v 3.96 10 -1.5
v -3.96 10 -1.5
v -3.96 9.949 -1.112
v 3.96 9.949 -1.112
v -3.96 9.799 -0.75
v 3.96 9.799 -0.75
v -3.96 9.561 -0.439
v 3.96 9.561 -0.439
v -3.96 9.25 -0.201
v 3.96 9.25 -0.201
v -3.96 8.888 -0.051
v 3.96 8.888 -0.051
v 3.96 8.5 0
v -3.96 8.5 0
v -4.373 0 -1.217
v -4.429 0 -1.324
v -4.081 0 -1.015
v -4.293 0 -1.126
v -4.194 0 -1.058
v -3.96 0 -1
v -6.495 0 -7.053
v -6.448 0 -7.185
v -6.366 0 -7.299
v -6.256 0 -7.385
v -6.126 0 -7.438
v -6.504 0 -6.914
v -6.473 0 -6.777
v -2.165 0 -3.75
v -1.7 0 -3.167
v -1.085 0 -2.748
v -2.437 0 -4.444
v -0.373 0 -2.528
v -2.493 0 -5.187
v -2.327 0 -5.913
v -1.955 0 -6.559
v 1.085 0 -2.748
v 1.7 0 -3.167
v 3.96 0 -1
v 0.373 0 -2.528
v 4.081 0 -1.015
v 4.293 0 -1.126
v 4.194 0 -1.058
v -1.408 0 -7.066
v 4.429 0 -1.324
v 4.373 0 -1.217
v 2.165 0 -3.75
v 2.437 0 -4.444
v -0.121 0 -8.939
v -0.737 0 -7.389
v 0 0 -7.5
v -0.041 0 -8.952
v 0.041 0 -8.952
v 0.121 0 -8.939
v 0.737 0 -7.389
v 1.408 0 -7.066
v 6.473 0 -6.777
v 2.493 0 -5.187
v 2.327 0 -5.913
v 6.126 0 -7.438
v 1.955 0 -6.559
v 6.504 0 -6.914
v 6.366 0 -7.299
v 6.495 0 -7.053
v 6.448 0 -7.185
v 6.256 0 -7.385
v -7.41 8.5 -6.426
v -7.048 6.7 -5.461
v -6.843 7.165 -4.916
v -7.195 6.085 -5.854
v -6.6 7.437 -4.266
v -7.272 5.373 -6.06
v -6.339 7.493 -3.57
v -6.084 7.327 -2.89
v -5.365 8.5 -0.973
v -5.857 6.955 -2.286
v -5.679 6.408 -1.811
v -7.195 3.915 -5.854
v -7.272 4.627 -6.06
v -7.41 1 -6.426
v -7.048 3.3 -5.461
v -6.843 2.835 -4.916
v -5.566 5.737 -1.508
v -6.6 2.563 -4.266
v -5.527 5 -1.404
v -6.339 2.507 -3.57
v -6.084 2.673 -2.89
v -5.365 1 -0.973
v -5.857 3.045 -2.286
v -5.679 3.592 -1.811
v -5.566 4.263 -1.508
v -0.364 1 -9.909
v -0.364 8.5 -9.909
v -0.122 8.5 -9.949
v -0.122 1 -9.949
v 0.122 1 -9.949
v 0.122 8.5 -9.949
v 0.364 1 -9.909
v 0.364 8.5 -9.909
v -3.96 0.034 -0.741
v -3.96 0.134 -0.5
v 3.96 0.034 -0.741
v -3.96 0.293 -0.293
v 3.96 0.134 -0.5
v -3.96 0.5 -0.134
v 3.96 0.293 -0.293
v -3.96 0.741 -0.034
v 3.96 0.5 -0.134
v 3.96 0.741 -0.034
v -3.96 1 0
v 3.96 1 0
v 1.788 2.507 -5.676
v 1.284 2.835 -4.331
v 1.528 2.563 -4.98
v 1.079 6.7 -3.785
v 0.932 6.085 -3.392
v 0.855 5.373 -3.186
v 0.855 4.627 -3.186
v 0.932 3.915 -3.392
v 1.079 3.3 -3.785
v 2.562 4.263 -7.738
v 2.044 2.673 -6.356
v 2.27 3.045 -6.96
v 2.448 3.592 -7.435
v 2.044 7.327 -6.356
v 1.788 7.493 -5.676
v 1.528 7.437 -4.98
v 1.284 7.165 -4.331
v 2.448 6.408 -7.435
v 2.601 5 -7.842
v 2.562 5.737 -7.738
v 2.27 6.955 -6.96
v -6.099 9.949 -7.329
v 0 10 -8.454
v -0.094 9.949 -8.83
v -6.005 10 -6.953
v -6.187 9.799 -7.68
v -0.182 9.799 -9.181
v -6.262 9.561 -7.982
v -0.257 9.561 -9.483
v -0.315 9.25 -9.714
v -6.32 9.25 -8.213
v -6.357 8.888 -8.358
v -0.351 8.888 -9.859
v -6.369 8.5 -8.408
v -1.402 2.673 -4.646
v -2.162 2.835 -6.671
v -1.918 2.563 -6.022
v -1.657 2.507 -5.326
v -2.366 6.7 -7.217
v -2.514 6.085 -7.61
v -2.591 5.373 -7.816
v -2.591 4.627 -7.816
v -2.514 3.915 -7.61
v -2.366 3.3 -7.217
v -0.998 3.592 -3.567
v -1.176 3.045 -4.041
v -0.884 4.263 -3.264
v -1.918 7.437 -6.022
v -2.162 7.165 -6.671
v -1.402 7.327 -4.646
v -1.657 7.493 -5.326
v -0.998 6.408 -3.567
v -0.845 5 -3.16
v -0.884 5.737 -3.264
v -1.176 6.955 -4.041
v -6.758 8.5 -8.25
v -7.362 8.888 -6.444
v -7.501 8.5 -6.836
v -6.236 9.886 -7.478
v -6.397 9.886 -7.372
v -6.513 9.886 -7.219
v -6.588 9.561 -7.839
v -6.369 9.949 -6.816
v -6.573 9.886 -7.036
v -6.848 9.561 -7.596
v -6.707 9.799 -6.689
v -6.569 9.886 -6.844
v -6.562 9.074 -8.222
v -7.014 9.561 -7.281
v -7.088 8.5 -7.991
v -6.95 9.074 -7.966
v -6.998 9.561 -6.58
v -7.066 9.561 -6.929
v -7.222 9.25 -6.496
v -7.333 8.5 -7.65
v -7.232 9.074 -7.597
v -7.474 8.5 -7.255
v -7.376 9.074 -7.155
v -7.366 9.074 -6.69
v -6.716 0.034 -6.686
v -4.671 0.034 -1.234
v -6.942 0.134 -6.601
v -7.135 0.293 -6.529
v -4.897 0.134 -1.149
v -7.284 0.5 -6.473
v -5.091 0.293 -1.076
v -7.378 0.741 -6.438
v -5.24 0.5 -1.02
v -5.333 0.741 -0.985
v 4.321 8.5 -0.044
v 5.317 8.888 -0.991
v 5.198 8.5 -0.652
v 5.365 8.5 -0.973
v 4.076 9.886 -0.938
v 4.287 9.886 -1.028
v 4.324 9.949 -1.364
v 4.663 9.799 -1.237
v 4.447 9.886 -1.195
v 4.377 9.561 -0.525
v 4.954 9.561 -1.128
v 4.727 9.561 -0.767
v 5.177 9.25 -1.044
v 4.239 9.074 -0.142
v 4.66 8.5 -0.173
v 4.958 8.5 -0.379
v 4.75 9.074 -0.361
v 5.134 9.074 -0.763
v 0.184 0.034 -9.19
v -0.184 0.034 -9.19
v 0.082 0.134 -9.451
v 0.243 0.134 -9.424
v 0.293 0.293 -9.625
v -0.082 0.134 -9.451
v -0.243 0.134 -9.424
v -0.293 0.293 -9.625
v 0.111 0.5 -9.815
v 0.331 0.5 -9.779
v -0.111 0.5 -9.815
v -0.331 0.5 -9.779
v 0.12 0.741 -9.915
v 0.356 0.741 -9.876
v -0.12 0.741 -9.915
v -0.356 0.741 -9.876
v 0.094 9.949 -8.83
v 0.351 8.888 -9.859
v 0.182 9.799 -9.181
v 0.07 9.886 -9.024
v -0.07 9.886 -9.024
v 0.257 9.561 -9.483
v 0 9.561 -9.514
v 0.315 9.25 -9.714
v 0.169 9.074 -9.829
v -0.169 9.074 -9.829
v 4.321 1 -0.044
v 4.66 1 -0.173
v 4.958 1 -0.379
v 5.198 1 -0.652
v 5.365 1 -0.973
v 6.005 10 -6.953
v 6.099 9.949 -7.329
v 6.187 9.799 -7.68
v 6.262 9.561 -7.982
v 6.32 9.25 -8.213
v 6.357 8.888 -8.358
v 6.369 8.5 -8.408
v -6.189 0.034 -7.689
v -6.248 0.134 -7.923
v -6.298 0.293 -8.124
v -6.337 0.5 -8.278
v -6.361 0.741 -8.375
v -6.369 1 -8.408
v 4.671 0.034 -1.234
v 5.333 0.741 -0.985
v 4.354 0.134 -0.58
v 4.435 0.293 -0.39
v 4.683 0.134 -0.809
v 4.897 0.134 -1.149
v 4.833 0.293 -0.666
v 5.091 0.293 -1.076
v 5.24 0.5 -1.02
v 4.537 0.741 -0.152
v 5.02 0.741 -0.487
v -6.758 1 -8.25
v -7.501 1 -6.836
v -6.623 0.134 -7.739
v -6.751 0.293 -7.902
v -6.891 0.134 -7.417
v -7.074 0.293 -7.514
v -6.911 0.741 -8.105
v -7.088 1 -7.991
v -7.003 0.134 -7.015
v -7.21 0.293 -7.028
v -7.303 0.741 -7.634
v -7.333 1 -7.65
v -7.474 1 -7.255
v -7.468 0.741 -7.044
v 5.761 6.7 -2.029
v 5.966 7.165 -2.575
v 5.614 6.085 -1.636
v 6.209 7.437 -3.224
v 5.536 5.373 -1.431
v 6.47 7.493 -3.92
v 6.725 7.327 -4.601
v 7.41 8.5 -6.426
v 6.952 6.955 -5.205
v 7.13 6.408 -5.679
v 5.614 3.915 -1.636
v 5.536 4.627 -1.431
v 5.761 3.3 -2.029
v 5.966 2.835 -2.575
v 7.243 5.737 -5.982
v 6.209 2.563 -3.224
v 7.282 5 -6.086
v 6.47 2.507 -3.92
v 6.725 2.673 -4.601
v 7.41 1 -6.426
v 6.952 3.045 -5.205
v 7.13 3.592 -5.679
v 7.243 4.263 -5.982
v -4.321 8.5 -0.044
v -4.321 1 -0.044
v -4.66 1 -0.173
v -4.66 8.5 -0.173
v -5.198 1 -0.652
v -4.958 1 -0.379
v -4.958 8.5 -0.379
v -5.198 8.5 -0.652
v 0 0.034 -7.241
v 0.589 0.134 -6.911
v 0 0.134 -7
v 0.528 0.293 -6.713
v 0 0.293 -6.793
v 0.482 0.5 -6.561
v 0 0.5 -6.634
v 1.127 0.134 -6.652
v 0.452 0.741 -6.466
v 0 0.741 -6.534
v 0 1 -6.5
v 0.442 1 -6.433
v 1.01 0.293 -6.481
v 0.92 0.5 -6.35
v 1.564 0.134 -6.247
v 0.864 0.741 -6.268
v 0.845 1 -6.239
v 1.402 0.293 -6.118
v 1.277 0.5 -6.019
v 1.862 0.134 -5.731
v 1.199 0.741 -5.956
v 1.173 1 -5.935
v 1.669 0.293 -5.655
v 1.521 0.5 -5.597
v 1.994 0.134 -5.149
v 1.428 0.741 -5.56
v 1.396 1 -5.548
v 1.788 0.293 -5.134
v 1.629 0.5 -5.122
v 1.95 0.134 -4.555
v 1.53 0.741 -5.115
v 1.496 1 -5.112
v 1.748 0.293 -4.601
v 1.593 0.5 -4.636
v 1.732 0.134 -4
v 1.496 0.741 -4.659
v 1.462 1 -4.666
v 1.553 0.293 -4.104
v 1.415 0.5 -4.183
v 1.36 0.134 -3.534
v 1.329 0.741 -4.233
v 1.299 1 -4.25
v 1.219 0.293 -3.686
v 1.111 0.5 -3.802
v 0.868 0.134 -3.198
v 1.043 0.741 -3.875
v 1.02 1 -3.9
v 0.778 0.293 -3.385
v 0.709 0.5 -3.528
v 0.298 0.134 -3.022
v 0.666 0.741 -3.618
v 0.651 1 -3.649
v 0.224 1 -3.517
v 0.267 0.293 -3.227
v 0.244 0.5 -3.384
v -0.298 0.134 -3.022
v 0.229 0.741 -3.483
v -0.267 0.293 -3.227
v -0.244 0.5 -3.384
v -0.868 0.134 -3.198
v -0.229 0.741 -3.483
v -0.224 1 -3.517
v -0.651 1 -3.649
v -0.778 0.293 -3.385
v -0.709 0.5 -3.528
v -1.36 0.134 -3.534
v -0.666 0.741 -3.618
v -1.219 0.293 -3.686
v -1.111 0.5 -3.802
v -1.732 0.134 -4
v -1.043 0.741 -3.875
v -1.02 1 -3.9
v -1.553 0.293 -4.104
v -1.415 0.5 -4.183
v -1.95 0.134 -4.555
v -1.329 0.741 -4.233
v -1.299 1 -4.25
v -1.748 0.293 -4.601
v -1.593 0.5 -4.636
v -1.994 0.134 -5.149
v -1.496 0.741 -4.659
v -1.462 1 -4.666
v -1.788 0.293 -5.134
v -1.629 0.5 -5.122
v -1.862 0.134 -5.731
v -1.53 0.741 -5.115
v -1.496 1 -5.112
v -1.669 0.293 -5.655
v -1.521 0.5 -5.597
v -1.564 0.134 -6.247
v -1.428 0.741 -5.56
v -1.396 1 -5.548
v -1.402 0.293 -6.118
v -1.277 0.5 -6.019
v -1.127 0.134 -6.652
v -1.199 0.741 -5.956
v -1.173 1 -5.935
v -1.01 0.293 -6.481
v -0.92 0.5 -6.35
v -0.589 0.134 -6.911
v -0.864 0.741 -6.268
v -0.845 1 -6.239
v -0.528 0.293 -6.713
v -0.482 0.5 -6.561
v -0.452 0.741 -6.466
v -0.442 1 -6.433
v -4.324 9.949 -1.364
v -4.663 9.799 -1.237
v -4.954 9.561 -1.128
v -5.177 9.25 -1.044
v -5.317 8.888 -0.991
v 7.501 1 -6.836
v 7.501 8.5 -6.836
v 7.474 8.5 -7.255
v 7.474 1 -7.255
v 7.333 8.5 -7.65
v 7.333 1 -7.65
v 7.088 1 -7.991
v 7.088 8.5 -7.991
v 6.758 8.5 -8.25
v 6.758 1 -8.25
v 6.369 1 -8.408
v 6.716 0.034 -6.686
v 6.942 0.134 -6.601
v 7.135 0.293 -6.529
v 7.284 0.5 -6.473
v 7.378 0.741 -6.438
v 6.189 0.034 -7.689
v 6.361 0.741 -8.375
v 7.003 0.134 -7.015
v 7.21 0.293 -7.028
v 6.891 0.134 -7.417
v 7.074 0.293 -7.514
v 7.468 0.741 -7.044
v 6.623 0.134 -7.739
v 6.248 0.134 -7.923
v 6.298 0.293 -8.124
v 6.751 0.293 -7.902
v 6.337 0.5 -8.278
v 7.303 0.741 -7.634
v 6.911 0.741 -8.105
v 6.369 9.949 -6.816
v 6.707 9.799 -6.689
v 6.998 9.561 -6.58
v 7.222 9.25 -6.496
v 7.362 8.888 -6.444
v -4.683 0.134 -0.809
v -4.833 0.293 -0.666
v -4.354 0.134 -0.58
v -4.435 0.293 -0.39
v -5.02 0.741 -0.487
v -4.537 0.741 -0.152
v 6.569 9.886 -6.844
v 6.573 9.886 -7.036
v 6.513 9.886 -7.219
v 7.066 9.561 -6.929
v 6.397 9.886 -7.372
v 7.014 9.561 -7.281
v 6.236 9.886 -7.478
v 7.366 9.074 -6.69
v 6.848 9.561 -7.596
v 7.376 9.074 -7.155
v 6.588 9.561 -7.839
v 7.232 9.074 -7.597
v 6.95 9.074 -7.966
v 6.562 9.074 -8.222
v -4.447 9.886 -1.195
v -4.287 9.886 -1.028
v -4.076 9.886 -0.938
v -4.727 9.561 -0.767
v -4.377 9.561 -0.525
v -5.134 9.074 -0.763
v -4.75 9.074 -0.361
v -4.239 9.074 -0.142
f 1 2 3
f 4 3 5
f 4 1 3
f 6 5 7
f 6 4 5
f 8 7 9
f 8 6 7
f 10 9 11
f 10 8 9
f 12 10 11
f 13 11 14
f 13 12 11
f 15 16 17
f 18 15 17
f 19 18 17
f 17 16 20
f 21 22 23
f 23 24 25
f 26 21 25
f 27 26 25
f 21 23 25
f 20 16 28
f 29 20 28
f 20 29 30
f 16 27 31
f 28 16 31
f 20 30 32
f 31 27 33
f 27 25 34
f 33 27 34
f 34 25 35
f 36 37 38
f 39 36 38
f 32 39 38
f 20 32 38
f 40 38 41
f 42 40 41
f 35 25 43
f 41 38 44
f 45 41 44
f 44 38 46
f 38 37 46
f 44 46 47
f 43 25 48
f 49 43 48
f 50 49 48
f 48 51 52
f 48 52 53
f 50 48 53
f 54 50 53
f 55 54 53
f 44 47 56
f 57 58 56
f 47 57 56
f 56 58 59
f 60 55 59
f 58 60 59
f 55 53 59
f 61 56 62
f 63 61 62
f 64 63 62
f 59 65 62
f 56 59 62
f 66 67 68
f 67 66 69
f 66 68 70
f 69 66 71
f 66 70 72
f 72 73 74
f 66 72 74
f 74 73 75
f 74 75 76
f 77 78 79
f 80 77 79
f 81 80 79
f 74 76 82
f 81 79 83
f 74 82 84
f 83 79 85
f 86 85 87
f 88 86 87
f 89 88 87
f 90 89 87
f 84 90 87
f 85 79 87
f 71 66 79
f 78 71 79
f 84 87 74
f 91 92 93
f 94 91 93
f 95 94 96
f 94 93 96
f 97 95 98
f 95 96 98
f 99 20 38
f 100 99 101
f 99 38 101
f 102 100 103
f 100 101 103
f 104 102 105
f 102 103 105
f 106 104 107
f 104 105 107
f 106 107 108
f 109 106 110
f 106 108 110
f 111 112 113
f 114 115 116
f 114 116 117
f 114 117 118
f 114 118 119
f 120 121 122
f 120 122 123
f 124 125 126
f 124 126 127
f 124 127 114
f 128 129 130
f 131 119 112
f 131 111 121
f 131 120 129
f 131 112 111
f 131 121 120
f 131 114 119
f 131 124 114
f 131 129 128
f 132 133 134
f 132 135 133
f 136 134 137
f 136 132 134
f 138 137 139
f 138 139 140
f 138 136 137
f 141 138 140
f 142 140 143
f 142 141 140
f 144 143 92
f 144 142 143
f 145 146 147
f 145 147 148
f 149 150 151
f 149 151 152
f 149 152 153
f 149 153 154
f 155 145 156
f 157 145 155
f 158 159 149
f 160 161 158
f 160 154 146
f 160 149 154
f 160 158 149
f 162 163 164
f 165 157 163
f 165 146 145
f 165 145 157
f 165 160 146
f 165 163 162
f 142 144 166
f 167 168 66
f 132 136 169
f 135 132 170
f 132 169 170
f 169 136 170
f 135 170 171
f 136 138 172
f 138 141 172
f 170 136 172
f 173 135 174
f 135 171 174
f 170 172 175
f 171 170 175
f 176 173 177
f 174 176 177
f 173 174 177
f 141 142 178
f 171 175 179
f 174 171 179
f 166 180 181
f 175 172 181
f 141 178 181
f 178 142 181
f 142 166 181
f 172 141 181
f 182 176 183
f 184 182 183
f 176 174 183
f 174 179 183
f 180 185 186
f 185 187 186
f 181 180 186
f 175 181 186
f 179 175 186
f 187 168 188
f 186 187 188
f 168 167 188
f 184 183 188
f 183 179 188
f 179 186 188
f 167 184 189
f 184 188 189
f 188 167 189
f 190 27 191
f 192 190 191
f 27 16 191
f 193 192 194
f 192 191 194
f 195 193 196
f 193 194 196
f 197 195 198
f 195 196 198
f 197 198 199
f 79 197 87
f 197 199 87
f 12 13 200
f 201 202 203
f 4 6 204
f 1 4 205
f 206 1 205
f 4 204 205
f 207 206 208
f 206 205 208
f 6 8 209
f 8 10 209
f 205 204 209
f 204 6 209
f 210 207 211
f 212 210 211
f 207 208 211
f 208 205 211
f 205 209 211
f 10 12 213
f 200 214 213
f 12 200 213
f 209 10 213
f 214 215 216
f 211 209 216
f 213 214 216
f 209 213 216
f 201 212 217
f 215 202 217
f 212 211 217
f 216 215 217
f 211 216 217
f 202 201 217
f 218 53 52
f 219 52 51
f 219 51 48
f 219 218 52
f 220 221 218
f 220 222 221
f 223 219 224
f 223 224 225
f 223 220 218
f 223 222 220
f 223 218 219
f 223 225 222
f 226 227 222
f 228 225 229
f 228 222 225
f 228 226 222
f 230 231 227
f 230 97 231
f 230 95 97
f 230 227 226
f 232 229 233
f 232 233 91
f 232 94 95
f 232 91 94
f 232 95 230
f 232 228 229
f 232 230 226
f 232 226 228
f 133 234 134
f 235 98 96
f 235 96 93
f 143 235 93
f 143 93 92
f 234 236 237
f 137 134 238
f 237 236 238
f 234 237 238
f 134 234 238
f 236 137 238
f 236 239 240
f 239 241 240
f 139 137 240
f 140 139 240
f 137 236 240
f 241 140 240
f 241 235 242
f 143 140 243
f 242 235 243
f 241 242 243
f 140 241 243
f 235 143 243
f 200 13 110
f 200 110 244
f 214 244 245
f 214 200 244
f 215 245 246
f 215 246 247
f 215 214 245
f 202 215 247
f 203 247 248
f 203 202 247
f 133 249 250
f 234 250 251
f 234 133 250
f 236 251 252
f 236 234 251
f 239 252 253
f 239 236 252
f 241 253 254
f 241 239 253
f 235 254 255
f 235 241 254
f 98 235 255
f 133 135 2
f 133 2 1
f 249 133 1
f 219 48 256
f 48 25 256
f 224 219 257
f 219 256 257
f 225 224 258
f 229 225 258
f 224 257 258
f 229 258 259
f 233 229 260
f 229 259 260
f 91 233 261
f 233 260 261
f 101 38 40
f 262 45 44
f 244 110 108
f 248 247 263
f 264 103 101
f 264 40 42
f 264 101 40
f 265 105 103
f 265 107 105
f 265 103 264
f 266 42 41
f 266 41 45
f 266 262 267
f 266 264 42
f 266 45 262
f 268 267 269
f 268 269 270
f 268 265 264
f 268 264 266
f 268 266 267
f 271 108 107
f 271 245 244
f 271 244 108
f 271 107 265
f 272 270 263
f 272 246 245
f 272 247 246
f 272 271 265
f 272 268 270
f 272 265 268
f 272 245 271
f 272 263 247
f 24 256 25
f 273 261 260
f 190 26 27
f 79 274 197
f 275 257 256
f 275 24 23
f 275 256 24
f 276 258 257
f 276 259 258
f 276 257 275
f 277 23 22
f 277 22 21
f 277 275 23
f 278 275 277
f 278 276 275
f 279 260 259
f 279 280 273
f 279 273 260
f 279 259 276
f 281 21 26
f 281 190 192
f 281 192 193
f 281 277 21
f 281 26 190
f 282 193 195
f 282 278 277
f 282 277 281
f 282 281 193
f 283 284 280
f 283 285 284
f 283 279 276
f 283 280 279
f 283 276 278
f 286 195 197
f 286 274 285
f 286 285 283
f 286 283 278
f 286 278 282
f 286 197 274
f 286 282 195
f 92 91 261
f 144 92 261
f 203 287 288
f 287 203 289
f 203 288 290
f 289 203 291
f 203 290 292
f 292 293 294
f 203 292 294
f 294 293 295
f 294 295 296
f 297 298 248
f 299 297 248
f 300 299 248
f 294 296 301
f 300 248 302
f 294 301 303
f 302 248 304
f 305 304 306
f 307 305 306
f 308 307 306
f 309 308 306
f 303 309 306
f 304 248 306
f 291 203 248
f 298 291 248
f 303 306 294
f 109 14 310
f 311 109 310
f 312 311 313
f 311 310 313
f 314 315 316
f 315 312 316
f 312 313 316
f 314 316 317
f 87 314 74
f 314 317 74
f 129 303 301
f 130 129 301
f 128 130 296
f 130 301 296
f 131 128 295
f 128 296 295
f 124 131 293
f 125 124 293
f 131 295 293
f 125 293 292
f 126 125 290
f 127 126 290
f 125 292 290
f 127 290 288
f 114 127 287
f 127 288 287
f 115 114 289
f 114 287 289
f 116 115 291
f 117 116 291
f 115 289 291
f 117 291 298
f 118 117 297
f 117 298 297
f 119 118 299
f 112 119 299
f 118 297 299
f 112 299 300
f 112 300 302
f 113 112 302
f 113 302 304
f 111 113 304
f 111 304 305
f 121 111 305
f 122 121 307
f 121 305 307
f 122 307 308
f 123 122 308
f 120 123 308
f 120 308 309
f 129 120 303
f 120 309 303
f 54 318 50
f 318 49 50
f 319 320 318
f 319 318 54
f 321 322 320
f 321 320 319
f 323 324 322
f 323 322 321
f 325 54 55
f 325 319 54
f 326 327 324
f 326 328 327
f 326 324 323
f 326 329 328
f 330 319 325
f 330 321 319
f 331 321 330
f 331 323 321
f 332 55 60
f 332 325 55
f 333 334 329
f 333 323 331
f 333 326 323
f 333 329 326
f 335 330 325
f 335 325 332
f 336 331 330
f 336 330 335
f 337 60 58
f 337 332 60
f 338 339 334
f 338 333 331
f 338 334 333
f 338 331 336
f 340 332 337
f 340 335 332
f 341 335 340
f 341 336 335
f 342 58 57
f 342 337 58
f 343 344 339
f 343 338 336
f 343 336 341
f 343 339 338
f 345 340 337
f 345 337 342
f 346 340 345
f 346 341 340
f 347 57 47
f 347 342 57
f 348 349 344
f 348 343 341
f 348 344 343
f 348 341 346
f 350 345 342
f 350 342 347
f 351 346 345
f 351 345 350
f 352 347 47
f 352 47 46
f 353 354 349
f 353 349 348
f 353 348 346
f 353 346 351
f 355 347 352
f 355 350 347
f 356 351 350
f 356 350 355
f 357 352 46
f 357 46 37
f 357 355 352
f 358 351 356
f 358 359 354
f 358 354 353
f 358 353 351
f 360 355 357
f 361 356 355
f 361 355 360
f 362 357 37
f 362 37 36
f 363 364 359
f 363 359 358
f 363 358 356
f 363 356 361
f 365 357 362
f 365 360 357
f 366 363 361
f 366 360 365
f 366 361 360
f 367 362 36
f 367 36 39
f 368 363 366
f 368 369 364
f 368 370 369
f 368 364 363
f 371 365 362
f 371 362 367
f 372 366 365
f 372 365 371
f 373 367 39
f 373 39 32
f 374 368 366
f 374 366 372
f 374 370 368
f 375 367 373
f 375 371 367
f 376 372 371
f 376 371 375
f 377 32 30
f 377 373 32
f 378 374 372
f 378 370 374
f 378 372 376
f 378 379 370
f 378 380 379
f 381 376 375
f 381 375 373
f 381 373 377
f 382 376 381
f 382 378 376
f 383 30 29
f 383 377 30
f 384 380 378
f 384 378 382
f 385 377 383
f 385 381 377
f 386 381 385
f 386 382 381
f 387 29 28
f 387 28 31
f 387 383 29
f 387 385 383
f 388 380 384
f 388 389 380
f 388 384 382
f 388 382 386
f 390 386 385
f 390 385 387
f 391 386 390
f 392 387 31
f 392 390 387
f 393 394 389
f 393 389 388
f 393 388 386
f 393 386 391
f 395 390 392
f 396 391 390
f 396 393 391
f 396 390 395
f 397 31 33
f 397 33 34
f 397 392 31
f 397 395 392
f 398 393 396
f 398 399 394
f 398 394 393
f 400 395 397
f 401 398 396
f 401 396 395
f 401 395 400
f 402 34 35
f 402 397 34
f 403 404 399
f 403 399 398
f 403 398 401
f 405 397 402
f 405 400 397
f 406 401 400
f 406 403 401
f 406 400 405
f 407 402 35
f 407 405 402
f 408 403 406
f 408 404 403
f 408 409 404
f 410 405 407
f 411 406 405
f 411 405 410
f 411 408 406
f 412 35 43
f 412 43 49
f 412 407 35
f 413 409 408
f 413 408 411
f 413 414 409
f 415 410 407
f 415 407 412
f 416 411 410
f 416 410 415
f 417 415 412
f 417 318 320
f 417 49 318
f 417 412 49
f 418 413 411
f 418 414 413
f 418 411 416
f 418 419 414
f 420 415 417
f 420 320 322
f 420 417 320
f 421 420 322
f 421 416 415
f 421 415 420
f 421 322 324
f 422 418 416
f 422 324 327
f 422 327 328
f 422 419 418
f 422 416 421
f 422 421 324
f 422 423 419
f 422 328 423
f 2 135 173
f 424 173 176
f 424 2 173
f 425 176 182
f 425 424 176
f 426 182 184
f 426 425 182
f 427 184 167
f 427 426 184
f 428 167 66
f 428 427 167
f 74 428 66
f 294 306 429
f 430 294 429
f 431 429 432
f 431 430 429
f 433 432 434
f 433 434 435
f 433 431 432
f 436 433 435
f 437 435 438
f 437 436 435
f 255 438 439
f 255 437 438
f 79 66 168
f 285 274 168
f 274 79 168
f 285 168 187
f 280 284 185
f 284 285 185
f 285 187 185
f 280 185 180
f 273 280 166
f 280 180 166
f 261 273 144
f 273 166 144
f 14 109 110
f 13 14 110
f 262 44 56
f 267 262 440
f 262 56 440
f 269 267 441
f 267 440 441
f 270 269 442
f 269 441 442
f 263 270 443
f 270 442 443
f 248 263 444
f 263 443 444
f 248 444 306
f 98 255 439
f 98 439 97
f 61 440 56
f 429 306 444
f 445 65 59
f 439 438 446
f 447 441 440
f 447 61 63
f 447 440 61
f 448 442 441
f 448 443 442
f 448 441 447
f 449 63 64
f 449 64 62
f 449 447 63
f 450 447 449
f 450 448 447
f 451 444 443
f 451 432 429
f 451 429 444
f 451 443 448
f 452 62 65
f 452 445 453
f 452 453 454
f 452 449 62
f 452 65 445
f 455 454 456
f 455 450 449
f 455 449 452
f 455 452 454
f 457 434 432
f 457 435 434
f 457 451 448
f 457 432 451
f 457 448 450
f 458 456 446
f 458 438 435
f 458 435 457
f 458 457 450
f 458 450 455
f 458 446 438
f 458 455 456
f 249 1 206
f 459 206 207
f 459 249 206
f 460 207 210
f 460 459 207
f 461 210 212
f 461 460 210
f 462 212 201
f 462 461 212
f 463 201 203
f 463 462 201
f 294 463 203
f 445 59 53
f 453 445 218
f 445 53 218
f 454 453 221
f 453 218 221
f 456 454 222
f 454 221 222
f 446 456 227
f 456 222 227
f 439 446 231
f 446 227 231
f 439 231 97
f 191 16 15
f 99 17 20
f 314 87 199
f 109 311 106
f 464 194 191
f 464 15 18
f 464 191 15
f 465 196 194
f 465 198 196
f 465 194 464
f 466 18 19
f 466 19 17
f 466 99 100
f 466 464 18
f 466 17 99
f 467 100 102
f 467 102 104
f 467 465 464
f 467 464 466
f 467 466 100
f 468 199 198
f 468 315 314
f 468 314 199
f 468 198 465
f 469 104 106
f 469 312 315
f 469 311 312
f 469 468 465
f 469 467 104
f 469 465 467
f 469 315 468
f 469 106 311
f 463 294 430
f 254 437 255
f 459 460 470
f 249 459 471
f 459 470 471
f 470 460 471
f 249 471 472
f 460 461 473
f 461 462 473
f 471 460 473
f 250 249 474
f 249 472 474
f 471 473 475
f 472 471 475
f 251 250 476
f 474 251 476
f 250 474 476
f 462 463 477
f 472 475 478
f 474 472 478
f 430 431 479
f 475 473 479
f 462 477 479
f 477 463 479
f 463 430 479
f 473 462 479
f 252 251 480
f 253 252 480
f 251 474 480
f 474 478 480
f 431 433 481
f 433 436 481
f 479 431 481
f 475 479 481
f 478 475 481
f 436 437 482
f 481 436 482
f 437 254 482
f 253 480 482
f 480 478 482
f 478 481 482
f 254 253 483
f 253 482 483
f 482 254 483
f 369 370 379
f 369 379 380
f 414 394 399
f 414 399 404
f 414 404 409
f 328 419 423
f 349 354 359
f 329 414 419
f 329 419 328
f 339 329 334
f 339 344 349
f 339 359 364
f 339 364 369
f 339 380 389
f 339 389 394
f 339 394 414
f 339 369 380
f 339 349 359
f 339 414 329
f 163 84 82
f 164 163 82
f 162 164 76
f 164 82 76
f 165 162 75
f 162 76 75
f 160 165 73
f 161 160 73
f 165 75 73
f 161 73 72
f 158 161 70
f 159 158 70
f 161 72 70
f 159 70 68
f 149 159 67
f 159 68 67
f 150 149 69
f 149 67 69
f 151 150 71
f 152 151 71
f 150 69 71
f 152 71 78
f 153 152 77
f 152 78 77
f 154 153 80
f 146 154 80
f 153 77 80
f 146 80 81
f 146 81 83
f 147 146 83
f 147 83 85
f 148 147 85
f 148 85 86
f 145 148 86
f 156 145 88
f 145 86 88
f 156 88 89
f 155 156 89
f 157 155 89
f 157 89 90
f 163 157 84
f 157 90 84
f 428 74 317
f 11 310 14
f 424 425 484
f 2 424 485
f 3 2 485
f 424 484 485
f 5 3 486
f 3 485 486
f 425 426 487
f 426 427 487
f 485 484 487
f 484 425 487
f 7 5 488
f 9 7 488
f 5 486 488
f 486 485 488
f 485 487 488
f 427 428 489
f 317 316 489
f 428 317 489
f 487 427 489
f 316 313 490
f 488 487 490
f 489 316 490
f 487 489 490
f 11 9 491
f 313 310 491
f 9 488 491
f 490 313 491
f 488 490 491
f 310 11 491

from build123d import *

# Parameters (mm, degrees)
BOSS_EXTRUDE1_DEPTH = 10
SKETCH2_R           = 2.5
CUT_EXTRUDE1_DEPTH  = 5
SKETCH3_R           = 2.5
CUT_EXTRUDE2_DEPTH  = 5
SKETCH4_R           = 1.5
CUT_EXTRUDE3_DEPTH  = 1
FILLET1_R           = 1.5
FILLET2_R           = 1.5
FILLET3_R           = 1


with BuildPart() as part:
    # Sketch1 → Boss-Extrude1 (new body)
    with BuildSketch(Plane(origin=(0, 0, 0), x_dir=(1, 0, 0), z_dir=(0, 1, 0))):
        Polygon((-5, 0), (5, 0), (8, 8), (0, 10), (-8, 8), align=None)
    extrude(amount=BOSS_EXTRUDE1_DEPTH)

    # Sketch2 → Cut-Extrude1 (cut)
    with BuildSketch(Plane(origin=(4.383561644, 0, 1.643835616), x_dir=(0.35112344158839154, 0, -0.9363291775690447), z_dir=(0.9363291775690445, 0, 0.3511234415883915))):
        with Locations((5.755617208, 5)):
            Circle(SKETCH2_R)
    extrude(amount=-CUT_EXTRUDE1_DEPTH, mode=Mode.SUBTRACT)

    # Sketch3 → Cut-Extrude2 (cut)
    with BuildSketch(Plane(origin=(-4.383561644, 0, 1.643835616), x_dir=(0.3511234415883919, 0, 0.9363291775690445), z_dir=(-0.9363291775690445, 0, 0.3511234415883919))):
        with Locations((-5.755617208, 5)):
            Circle(SKETCH3_R)
    extrude(amount=-CUT_EXTRUDE2_DEPTH, mode=Mode.SUBTRACT)

    # Sketch4 → Cut-Extrude3 (cut)
    with BuildSketch(Plane.XZ):
        with Locations(Location((0, -5, 0), (0, 0, 270))):
            Circle(SKETCH4_R)
    extrude(amount=-CUT_EXTRUDE3_DEPTH, mode=Mode.SUBTRACT)

    # Fillet1
    fillet1_edges = [part.edges().sort_by_distance(p)[0] for p in [
        (-8, 5, -8),
        (0, 5, -10),
        (8, 5, -8),
        (5, 5, 0),
        (-5, 5, 0),
    ]]
    fillet(fillet1_edges, radius=FILLET1_R)

    # Fillet2
    fillet2_edges = [part.edges().sort_by_distance(p)[0] for p in [
        (-3.366403469, 10, -9.158399133),
        (3.366403469, 10, -9.158399133),
        (-6.387343447, 10, -3.699582525),
        (0, 10, 0),
        (6.387343447, 10, -3.699582525),
        (7.333243577, 10, -7.649887814),
        (4.814891554, 10, -0.267111574),
        (-4.814891554, 10, -0.267111574),
        (-7.333243577, 10, -7.649887814),
        (0, 10, -9.95383539),
    ]]
    fillet(fillet2_edges, radius=FILLET2_R)

    # Fillet3
    fillet3_edges = [part.edges().sort_by_distance(p)[0] for p in [
        (0, 0, -3.5),
        (-3.366403469, 0, -9.158399133),
        (-6.387343447, 0, -3.699582525),
        (3.366403469, 0, -9.158399133),
        (6.387343447, 0, -3.699582525),
        (0, 0, 0),
        (7.333243577, 0, -7.649887814),
        (4.814891554, 0, -0.267111574),
        (-4.814891554, 0, -0.267111574),
        (-7.333243577, 0, -7.649887814),
        (0, 0, -9.95383539),
    ]]
    fillet(fillet3_edges, radius=FILLET3_R - 0.0001)  # a hair under: the kernel refuses the full size


solid = part.part
